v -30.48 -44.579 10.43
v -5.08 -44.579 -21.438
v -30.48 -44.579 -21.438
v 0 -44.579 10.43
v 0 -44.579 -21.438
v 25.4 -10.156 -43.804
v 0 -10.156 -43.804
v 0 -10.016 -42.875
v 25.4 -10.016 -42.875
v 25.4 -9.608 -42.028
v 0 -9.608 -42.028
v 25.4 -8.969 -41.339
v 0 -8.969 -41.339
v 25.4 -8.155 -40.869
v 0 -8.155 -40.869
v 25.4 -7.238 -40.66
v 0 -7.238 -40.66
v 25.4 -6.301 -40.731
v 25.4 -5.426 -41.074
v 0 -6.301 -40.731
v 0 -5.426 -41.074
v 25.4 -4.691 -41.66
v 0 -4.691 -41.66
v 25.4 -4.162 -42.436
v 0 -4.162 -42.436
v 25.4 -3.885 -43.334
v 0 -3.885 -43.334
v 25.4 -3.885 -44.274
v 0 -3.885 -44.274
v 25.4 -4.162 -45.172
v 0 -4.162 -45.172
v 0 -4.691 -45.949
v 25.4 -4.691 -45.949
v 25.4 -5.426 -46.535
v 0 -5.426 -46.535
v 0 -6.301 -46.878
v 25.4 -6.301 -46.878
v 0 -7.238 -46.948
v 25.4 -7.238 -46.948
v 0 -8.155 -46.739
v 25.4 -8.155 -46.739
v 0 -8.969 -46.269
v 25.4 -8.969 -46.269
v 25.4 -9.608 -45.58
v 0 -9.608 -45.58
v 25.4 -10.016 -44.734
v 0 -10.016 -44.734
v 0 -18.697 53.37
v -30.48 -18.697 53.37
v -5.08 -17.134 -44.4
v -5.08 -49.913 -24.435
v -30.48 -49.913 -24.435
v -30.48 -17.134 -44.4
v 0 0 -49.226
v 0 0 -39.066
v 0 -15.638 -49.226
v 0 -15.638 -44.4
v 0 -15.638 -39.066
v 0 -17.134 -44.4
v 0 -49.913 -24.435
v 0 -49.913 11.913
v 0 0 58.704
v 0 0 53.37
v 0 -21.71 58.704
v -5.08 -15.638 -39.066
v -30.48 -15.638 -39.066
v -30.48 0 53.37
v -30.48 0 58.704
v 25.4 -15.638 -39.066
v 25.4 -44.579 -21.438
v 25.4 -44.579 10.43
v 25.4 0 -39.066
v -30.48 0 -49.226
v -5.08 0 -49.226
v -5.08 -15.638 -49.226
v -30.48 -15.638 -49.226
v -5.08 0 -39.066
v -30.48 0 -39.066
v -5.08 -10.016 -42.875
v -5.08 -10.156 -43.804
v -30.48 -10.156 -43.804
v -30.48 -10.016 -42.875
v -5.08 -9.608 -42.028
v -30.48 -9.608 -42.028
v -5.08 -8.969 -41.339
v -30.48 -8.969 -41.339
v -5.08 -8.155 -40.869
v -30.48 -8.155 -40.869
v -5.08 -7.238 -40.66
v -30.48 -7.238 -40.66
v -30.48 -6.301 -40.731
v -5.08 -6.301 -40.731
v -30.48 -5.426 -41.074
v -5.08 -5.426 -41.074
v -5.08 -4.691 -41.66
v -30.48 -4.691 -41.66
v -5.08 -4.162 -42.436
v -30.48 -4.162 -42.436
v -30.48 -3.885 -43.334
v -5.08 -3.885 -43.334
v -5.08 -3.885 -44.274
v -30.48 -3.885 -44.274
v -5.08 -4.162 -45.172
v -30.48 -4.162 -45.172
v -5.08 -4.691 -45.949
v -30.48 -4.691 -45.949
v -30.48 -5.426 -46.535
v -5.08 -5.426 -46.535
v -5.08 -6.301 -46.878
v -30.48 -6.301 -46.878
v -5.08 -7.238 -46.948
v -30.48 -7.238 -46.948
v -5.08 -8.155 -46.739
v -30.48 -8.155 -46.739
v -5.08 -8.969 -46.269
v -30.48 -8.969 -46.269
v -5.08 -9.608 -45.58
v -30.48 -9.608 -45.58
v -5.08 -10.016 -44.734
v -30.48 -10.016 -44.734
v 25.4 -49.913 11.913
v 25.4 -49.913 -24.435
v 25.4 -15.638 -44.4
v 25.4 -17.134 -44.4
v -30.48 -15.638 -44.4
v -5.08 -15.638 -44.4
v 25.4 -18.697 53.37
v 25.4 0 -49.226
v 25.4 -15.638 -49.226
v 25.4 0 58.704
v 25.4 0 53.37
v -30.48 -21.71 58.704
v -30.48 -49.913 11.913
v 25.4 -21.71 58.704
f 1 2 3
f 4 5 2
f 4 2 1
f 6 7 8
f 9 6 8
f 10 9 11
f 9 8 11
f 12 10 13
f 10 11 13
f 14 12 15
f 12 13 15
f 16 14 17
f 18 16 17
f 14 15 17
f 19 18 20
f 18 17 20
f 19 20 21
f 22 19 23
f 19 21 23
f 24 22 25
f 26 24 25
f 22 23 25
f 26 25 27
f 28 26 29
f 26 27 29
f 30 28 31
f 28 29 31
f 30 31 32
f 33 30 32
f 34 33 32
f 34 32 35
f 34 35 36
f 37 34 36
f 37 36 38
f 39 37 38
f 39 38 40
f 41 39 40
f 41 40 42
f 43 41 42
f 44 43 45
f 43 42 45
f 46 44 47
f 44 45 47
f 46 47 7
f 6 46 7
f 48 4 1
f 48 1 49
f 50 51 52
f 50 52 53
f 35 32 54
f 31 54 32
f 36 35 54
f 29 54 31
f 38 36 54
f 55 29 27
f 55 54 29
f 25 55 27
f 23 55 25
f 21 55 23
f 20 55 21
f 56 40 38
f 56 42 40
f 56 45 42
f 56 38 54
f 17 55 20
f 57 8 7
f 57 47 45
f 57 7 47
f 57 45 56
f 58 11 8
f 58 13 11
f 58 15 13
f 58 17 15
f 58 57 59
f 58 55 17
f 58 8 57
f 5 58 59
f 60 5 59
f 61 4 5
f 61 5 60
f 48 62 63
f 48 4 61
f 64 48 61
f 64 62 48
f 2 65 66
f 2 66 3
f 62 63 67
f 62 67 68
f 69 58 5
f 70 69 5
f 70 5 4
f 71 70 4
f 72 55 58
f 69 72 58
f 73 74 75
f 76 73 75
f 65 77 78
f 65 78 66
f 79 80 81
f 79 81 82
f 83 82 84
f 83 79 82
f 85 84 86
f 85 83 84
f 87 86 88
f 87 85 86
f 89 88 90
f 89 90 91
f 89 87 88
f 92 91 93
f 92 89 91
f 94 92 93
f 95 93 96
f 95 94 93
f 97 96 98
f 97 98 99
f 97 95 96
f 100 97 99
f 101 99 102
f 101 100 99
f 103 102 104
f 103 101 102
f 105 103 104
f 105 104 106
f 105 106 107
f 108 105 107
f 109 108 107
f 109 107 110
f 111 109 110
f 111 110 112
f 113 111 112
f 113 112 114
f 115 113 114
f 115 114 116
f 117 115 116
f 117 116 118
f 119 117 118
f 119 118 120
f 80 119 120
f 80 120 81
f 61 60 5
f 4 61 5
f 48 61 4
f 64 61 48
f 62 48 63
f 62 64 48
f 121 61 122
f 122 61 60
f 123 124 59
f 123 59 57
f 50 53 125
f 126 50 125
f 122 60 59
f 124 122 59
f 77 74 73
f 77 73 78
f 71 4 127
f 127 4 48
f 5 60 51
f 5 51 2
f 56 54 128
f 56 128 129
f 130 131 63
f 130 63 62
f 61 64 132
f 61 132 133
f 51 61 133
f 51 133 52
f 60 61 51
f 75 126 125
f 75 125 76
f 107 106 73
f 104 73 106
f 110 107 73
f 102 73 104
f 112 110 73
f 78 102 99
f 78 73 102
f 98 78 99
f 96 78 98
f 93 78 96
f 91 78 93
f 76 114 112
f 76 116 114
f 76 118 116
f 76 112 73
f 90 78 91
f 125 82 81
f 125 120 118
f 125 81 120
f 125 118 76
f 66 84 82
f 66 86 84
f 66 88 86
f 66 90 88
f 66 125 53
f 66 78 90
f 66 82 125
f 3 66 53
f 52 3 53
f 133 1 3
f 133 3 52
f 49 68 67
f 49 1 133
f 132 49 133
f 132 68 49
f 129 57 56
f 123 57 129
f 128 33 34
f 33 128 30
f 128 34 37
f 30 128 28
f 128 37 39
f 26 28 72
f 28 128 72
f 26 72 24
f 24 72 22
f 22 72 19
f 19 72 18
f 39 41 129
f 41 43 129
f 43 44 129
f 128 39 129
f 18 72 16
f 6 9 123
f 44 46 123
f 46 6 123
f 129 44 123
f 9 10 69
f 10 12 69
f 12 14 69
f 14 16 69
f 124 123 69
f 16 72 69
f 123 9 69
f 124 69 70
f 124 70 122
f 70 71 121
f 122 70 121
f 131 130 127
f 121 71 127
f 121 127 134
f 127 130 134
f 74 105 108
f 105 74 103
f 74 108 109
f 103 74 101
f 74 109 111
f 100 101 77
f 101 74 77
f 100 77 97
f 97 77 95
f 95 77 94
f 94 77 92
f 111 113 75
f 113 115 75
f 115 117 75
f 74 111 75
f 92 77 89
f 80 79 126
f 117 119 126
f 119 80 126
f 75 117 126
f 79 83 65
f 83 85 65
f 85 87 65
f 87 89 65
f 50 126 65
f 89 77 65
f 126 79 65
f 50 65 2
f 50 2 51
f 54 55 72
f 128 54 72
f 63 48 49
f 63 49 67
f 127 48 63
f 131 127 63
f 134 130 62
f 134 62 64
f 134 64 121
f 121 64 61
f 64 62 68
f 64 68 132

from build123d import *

# Parameters (mm, degrees)
F1_DEPTH = 25.4
F2_DEPTH = 10.16
F3_R     = 3.1528992533
F4_DEPTH = 25.4
F5_DEPTH = 30.48
F6_DEPTH = 5.08
F7_DEPTH = 5.08


with BuildPart() as f1:
    # F0 (on Right) → F1 (new body)
    with BuildSketch(Plane.YZ):
        Polygon((0, 53.3697988007), (0, 58.7037988007), (-21.7103212485, 58.7037988007), (-49.9131307006, 11.9127783076), (-49.9131307006, -24.4350843132), (-44.5791307006, -21.4384287332), (-44.5791307006, 10.4295662253), (-18.6973443152, 53.3697988007), align=None)
        Polygon((-44.5791307006, -21.4384287332), (-49.9131307006, -24.4350843132), (-17.1343572438, -44.4003343582), (0, -44.4003343582), (0, -39.0663343582), (-15.6377889345, -39.0663343582), align=None)
    extrude(amount=F1_DEPTH)

    # F2 (add): a face of the model
    f2_faces = [f1.faces().sort_by_distance(p)[0] for p in [
        (12.7, -7.8188944672, -39.0663343582),
    ]]
    extrude(f2_faces, amount=-F2_DEPTH)

    # F3 (on face) → F4 (cut)
    with BuildSketch(Plane(origin=(0, 0, 0), x_dir=(0, -1, 0), z_dir=(-1, 0, 0))):
        with Locations((7.0027378388, -43.8043549657)):
            Circle(F3_R)
    extrude(amount=-F4_DEPTH, mode=Mode.SUBTRACT)


with BuildPart() as f5:
    # F5 (new): a face of the model
    f5_faces = [f1.part.faces().sort_by_distance(p)[0] for p in [
        (0, -32.6566725698, 32.5135338393),
    ]]
    extrude(f5_faces, amount=F5_DEPTH)

    # F3 (on face) → F6 (cut)
    with BuildSketch(Plane(origin=(0, 0, 0), x_dir=(0, -1, 0), z_dir=(-1, 0, 0))):
        Polygon((0, 53.3697988007), (18.6973443152, 53.3697988007), (44.5791307006, 10.4295662253), (44.5791307006, -21.4384287332), (15.6377889345, -39.0663343582), (0, -39.0663343582), (0, -49.2263343582), (15.6377889345, -49.2263343582), (15.6377889345, -44.4003343582), (17.1343572438, -44.4003343582), (49.9131307006, -24.4350843132), (49.9131307006, 11.9127783076), (21.7103212485, 58.7037988007), (0, 58.7037988007), align=None)
        with Locations((7.0027378388, -43.8043549657)):
            Circle(F3_R, mode=Mode.SUBTRACT)
    extrude(amount=F6_DEPTH, mode=Mode.SUBTRACT)

    # F0 (on Right) → F7 (join)
    with BuildSketch(Plane.YZ):
        Polygon((0, 53.3697988007), (0, 58.7037988007), (-21.7103212485, 58.7037988007), (-49.9131307006, 11.9127783076), (-49.9131307006, -24.4350843132), (-44.5791307006, -21.4384287332), (-44.5791307006, 10.4295662253), (-18.6973443152, 53.3697988007), align=None)
    extrude(amount=-F7_DEPTH)


solid = Compound([f1.part, f5.part])
